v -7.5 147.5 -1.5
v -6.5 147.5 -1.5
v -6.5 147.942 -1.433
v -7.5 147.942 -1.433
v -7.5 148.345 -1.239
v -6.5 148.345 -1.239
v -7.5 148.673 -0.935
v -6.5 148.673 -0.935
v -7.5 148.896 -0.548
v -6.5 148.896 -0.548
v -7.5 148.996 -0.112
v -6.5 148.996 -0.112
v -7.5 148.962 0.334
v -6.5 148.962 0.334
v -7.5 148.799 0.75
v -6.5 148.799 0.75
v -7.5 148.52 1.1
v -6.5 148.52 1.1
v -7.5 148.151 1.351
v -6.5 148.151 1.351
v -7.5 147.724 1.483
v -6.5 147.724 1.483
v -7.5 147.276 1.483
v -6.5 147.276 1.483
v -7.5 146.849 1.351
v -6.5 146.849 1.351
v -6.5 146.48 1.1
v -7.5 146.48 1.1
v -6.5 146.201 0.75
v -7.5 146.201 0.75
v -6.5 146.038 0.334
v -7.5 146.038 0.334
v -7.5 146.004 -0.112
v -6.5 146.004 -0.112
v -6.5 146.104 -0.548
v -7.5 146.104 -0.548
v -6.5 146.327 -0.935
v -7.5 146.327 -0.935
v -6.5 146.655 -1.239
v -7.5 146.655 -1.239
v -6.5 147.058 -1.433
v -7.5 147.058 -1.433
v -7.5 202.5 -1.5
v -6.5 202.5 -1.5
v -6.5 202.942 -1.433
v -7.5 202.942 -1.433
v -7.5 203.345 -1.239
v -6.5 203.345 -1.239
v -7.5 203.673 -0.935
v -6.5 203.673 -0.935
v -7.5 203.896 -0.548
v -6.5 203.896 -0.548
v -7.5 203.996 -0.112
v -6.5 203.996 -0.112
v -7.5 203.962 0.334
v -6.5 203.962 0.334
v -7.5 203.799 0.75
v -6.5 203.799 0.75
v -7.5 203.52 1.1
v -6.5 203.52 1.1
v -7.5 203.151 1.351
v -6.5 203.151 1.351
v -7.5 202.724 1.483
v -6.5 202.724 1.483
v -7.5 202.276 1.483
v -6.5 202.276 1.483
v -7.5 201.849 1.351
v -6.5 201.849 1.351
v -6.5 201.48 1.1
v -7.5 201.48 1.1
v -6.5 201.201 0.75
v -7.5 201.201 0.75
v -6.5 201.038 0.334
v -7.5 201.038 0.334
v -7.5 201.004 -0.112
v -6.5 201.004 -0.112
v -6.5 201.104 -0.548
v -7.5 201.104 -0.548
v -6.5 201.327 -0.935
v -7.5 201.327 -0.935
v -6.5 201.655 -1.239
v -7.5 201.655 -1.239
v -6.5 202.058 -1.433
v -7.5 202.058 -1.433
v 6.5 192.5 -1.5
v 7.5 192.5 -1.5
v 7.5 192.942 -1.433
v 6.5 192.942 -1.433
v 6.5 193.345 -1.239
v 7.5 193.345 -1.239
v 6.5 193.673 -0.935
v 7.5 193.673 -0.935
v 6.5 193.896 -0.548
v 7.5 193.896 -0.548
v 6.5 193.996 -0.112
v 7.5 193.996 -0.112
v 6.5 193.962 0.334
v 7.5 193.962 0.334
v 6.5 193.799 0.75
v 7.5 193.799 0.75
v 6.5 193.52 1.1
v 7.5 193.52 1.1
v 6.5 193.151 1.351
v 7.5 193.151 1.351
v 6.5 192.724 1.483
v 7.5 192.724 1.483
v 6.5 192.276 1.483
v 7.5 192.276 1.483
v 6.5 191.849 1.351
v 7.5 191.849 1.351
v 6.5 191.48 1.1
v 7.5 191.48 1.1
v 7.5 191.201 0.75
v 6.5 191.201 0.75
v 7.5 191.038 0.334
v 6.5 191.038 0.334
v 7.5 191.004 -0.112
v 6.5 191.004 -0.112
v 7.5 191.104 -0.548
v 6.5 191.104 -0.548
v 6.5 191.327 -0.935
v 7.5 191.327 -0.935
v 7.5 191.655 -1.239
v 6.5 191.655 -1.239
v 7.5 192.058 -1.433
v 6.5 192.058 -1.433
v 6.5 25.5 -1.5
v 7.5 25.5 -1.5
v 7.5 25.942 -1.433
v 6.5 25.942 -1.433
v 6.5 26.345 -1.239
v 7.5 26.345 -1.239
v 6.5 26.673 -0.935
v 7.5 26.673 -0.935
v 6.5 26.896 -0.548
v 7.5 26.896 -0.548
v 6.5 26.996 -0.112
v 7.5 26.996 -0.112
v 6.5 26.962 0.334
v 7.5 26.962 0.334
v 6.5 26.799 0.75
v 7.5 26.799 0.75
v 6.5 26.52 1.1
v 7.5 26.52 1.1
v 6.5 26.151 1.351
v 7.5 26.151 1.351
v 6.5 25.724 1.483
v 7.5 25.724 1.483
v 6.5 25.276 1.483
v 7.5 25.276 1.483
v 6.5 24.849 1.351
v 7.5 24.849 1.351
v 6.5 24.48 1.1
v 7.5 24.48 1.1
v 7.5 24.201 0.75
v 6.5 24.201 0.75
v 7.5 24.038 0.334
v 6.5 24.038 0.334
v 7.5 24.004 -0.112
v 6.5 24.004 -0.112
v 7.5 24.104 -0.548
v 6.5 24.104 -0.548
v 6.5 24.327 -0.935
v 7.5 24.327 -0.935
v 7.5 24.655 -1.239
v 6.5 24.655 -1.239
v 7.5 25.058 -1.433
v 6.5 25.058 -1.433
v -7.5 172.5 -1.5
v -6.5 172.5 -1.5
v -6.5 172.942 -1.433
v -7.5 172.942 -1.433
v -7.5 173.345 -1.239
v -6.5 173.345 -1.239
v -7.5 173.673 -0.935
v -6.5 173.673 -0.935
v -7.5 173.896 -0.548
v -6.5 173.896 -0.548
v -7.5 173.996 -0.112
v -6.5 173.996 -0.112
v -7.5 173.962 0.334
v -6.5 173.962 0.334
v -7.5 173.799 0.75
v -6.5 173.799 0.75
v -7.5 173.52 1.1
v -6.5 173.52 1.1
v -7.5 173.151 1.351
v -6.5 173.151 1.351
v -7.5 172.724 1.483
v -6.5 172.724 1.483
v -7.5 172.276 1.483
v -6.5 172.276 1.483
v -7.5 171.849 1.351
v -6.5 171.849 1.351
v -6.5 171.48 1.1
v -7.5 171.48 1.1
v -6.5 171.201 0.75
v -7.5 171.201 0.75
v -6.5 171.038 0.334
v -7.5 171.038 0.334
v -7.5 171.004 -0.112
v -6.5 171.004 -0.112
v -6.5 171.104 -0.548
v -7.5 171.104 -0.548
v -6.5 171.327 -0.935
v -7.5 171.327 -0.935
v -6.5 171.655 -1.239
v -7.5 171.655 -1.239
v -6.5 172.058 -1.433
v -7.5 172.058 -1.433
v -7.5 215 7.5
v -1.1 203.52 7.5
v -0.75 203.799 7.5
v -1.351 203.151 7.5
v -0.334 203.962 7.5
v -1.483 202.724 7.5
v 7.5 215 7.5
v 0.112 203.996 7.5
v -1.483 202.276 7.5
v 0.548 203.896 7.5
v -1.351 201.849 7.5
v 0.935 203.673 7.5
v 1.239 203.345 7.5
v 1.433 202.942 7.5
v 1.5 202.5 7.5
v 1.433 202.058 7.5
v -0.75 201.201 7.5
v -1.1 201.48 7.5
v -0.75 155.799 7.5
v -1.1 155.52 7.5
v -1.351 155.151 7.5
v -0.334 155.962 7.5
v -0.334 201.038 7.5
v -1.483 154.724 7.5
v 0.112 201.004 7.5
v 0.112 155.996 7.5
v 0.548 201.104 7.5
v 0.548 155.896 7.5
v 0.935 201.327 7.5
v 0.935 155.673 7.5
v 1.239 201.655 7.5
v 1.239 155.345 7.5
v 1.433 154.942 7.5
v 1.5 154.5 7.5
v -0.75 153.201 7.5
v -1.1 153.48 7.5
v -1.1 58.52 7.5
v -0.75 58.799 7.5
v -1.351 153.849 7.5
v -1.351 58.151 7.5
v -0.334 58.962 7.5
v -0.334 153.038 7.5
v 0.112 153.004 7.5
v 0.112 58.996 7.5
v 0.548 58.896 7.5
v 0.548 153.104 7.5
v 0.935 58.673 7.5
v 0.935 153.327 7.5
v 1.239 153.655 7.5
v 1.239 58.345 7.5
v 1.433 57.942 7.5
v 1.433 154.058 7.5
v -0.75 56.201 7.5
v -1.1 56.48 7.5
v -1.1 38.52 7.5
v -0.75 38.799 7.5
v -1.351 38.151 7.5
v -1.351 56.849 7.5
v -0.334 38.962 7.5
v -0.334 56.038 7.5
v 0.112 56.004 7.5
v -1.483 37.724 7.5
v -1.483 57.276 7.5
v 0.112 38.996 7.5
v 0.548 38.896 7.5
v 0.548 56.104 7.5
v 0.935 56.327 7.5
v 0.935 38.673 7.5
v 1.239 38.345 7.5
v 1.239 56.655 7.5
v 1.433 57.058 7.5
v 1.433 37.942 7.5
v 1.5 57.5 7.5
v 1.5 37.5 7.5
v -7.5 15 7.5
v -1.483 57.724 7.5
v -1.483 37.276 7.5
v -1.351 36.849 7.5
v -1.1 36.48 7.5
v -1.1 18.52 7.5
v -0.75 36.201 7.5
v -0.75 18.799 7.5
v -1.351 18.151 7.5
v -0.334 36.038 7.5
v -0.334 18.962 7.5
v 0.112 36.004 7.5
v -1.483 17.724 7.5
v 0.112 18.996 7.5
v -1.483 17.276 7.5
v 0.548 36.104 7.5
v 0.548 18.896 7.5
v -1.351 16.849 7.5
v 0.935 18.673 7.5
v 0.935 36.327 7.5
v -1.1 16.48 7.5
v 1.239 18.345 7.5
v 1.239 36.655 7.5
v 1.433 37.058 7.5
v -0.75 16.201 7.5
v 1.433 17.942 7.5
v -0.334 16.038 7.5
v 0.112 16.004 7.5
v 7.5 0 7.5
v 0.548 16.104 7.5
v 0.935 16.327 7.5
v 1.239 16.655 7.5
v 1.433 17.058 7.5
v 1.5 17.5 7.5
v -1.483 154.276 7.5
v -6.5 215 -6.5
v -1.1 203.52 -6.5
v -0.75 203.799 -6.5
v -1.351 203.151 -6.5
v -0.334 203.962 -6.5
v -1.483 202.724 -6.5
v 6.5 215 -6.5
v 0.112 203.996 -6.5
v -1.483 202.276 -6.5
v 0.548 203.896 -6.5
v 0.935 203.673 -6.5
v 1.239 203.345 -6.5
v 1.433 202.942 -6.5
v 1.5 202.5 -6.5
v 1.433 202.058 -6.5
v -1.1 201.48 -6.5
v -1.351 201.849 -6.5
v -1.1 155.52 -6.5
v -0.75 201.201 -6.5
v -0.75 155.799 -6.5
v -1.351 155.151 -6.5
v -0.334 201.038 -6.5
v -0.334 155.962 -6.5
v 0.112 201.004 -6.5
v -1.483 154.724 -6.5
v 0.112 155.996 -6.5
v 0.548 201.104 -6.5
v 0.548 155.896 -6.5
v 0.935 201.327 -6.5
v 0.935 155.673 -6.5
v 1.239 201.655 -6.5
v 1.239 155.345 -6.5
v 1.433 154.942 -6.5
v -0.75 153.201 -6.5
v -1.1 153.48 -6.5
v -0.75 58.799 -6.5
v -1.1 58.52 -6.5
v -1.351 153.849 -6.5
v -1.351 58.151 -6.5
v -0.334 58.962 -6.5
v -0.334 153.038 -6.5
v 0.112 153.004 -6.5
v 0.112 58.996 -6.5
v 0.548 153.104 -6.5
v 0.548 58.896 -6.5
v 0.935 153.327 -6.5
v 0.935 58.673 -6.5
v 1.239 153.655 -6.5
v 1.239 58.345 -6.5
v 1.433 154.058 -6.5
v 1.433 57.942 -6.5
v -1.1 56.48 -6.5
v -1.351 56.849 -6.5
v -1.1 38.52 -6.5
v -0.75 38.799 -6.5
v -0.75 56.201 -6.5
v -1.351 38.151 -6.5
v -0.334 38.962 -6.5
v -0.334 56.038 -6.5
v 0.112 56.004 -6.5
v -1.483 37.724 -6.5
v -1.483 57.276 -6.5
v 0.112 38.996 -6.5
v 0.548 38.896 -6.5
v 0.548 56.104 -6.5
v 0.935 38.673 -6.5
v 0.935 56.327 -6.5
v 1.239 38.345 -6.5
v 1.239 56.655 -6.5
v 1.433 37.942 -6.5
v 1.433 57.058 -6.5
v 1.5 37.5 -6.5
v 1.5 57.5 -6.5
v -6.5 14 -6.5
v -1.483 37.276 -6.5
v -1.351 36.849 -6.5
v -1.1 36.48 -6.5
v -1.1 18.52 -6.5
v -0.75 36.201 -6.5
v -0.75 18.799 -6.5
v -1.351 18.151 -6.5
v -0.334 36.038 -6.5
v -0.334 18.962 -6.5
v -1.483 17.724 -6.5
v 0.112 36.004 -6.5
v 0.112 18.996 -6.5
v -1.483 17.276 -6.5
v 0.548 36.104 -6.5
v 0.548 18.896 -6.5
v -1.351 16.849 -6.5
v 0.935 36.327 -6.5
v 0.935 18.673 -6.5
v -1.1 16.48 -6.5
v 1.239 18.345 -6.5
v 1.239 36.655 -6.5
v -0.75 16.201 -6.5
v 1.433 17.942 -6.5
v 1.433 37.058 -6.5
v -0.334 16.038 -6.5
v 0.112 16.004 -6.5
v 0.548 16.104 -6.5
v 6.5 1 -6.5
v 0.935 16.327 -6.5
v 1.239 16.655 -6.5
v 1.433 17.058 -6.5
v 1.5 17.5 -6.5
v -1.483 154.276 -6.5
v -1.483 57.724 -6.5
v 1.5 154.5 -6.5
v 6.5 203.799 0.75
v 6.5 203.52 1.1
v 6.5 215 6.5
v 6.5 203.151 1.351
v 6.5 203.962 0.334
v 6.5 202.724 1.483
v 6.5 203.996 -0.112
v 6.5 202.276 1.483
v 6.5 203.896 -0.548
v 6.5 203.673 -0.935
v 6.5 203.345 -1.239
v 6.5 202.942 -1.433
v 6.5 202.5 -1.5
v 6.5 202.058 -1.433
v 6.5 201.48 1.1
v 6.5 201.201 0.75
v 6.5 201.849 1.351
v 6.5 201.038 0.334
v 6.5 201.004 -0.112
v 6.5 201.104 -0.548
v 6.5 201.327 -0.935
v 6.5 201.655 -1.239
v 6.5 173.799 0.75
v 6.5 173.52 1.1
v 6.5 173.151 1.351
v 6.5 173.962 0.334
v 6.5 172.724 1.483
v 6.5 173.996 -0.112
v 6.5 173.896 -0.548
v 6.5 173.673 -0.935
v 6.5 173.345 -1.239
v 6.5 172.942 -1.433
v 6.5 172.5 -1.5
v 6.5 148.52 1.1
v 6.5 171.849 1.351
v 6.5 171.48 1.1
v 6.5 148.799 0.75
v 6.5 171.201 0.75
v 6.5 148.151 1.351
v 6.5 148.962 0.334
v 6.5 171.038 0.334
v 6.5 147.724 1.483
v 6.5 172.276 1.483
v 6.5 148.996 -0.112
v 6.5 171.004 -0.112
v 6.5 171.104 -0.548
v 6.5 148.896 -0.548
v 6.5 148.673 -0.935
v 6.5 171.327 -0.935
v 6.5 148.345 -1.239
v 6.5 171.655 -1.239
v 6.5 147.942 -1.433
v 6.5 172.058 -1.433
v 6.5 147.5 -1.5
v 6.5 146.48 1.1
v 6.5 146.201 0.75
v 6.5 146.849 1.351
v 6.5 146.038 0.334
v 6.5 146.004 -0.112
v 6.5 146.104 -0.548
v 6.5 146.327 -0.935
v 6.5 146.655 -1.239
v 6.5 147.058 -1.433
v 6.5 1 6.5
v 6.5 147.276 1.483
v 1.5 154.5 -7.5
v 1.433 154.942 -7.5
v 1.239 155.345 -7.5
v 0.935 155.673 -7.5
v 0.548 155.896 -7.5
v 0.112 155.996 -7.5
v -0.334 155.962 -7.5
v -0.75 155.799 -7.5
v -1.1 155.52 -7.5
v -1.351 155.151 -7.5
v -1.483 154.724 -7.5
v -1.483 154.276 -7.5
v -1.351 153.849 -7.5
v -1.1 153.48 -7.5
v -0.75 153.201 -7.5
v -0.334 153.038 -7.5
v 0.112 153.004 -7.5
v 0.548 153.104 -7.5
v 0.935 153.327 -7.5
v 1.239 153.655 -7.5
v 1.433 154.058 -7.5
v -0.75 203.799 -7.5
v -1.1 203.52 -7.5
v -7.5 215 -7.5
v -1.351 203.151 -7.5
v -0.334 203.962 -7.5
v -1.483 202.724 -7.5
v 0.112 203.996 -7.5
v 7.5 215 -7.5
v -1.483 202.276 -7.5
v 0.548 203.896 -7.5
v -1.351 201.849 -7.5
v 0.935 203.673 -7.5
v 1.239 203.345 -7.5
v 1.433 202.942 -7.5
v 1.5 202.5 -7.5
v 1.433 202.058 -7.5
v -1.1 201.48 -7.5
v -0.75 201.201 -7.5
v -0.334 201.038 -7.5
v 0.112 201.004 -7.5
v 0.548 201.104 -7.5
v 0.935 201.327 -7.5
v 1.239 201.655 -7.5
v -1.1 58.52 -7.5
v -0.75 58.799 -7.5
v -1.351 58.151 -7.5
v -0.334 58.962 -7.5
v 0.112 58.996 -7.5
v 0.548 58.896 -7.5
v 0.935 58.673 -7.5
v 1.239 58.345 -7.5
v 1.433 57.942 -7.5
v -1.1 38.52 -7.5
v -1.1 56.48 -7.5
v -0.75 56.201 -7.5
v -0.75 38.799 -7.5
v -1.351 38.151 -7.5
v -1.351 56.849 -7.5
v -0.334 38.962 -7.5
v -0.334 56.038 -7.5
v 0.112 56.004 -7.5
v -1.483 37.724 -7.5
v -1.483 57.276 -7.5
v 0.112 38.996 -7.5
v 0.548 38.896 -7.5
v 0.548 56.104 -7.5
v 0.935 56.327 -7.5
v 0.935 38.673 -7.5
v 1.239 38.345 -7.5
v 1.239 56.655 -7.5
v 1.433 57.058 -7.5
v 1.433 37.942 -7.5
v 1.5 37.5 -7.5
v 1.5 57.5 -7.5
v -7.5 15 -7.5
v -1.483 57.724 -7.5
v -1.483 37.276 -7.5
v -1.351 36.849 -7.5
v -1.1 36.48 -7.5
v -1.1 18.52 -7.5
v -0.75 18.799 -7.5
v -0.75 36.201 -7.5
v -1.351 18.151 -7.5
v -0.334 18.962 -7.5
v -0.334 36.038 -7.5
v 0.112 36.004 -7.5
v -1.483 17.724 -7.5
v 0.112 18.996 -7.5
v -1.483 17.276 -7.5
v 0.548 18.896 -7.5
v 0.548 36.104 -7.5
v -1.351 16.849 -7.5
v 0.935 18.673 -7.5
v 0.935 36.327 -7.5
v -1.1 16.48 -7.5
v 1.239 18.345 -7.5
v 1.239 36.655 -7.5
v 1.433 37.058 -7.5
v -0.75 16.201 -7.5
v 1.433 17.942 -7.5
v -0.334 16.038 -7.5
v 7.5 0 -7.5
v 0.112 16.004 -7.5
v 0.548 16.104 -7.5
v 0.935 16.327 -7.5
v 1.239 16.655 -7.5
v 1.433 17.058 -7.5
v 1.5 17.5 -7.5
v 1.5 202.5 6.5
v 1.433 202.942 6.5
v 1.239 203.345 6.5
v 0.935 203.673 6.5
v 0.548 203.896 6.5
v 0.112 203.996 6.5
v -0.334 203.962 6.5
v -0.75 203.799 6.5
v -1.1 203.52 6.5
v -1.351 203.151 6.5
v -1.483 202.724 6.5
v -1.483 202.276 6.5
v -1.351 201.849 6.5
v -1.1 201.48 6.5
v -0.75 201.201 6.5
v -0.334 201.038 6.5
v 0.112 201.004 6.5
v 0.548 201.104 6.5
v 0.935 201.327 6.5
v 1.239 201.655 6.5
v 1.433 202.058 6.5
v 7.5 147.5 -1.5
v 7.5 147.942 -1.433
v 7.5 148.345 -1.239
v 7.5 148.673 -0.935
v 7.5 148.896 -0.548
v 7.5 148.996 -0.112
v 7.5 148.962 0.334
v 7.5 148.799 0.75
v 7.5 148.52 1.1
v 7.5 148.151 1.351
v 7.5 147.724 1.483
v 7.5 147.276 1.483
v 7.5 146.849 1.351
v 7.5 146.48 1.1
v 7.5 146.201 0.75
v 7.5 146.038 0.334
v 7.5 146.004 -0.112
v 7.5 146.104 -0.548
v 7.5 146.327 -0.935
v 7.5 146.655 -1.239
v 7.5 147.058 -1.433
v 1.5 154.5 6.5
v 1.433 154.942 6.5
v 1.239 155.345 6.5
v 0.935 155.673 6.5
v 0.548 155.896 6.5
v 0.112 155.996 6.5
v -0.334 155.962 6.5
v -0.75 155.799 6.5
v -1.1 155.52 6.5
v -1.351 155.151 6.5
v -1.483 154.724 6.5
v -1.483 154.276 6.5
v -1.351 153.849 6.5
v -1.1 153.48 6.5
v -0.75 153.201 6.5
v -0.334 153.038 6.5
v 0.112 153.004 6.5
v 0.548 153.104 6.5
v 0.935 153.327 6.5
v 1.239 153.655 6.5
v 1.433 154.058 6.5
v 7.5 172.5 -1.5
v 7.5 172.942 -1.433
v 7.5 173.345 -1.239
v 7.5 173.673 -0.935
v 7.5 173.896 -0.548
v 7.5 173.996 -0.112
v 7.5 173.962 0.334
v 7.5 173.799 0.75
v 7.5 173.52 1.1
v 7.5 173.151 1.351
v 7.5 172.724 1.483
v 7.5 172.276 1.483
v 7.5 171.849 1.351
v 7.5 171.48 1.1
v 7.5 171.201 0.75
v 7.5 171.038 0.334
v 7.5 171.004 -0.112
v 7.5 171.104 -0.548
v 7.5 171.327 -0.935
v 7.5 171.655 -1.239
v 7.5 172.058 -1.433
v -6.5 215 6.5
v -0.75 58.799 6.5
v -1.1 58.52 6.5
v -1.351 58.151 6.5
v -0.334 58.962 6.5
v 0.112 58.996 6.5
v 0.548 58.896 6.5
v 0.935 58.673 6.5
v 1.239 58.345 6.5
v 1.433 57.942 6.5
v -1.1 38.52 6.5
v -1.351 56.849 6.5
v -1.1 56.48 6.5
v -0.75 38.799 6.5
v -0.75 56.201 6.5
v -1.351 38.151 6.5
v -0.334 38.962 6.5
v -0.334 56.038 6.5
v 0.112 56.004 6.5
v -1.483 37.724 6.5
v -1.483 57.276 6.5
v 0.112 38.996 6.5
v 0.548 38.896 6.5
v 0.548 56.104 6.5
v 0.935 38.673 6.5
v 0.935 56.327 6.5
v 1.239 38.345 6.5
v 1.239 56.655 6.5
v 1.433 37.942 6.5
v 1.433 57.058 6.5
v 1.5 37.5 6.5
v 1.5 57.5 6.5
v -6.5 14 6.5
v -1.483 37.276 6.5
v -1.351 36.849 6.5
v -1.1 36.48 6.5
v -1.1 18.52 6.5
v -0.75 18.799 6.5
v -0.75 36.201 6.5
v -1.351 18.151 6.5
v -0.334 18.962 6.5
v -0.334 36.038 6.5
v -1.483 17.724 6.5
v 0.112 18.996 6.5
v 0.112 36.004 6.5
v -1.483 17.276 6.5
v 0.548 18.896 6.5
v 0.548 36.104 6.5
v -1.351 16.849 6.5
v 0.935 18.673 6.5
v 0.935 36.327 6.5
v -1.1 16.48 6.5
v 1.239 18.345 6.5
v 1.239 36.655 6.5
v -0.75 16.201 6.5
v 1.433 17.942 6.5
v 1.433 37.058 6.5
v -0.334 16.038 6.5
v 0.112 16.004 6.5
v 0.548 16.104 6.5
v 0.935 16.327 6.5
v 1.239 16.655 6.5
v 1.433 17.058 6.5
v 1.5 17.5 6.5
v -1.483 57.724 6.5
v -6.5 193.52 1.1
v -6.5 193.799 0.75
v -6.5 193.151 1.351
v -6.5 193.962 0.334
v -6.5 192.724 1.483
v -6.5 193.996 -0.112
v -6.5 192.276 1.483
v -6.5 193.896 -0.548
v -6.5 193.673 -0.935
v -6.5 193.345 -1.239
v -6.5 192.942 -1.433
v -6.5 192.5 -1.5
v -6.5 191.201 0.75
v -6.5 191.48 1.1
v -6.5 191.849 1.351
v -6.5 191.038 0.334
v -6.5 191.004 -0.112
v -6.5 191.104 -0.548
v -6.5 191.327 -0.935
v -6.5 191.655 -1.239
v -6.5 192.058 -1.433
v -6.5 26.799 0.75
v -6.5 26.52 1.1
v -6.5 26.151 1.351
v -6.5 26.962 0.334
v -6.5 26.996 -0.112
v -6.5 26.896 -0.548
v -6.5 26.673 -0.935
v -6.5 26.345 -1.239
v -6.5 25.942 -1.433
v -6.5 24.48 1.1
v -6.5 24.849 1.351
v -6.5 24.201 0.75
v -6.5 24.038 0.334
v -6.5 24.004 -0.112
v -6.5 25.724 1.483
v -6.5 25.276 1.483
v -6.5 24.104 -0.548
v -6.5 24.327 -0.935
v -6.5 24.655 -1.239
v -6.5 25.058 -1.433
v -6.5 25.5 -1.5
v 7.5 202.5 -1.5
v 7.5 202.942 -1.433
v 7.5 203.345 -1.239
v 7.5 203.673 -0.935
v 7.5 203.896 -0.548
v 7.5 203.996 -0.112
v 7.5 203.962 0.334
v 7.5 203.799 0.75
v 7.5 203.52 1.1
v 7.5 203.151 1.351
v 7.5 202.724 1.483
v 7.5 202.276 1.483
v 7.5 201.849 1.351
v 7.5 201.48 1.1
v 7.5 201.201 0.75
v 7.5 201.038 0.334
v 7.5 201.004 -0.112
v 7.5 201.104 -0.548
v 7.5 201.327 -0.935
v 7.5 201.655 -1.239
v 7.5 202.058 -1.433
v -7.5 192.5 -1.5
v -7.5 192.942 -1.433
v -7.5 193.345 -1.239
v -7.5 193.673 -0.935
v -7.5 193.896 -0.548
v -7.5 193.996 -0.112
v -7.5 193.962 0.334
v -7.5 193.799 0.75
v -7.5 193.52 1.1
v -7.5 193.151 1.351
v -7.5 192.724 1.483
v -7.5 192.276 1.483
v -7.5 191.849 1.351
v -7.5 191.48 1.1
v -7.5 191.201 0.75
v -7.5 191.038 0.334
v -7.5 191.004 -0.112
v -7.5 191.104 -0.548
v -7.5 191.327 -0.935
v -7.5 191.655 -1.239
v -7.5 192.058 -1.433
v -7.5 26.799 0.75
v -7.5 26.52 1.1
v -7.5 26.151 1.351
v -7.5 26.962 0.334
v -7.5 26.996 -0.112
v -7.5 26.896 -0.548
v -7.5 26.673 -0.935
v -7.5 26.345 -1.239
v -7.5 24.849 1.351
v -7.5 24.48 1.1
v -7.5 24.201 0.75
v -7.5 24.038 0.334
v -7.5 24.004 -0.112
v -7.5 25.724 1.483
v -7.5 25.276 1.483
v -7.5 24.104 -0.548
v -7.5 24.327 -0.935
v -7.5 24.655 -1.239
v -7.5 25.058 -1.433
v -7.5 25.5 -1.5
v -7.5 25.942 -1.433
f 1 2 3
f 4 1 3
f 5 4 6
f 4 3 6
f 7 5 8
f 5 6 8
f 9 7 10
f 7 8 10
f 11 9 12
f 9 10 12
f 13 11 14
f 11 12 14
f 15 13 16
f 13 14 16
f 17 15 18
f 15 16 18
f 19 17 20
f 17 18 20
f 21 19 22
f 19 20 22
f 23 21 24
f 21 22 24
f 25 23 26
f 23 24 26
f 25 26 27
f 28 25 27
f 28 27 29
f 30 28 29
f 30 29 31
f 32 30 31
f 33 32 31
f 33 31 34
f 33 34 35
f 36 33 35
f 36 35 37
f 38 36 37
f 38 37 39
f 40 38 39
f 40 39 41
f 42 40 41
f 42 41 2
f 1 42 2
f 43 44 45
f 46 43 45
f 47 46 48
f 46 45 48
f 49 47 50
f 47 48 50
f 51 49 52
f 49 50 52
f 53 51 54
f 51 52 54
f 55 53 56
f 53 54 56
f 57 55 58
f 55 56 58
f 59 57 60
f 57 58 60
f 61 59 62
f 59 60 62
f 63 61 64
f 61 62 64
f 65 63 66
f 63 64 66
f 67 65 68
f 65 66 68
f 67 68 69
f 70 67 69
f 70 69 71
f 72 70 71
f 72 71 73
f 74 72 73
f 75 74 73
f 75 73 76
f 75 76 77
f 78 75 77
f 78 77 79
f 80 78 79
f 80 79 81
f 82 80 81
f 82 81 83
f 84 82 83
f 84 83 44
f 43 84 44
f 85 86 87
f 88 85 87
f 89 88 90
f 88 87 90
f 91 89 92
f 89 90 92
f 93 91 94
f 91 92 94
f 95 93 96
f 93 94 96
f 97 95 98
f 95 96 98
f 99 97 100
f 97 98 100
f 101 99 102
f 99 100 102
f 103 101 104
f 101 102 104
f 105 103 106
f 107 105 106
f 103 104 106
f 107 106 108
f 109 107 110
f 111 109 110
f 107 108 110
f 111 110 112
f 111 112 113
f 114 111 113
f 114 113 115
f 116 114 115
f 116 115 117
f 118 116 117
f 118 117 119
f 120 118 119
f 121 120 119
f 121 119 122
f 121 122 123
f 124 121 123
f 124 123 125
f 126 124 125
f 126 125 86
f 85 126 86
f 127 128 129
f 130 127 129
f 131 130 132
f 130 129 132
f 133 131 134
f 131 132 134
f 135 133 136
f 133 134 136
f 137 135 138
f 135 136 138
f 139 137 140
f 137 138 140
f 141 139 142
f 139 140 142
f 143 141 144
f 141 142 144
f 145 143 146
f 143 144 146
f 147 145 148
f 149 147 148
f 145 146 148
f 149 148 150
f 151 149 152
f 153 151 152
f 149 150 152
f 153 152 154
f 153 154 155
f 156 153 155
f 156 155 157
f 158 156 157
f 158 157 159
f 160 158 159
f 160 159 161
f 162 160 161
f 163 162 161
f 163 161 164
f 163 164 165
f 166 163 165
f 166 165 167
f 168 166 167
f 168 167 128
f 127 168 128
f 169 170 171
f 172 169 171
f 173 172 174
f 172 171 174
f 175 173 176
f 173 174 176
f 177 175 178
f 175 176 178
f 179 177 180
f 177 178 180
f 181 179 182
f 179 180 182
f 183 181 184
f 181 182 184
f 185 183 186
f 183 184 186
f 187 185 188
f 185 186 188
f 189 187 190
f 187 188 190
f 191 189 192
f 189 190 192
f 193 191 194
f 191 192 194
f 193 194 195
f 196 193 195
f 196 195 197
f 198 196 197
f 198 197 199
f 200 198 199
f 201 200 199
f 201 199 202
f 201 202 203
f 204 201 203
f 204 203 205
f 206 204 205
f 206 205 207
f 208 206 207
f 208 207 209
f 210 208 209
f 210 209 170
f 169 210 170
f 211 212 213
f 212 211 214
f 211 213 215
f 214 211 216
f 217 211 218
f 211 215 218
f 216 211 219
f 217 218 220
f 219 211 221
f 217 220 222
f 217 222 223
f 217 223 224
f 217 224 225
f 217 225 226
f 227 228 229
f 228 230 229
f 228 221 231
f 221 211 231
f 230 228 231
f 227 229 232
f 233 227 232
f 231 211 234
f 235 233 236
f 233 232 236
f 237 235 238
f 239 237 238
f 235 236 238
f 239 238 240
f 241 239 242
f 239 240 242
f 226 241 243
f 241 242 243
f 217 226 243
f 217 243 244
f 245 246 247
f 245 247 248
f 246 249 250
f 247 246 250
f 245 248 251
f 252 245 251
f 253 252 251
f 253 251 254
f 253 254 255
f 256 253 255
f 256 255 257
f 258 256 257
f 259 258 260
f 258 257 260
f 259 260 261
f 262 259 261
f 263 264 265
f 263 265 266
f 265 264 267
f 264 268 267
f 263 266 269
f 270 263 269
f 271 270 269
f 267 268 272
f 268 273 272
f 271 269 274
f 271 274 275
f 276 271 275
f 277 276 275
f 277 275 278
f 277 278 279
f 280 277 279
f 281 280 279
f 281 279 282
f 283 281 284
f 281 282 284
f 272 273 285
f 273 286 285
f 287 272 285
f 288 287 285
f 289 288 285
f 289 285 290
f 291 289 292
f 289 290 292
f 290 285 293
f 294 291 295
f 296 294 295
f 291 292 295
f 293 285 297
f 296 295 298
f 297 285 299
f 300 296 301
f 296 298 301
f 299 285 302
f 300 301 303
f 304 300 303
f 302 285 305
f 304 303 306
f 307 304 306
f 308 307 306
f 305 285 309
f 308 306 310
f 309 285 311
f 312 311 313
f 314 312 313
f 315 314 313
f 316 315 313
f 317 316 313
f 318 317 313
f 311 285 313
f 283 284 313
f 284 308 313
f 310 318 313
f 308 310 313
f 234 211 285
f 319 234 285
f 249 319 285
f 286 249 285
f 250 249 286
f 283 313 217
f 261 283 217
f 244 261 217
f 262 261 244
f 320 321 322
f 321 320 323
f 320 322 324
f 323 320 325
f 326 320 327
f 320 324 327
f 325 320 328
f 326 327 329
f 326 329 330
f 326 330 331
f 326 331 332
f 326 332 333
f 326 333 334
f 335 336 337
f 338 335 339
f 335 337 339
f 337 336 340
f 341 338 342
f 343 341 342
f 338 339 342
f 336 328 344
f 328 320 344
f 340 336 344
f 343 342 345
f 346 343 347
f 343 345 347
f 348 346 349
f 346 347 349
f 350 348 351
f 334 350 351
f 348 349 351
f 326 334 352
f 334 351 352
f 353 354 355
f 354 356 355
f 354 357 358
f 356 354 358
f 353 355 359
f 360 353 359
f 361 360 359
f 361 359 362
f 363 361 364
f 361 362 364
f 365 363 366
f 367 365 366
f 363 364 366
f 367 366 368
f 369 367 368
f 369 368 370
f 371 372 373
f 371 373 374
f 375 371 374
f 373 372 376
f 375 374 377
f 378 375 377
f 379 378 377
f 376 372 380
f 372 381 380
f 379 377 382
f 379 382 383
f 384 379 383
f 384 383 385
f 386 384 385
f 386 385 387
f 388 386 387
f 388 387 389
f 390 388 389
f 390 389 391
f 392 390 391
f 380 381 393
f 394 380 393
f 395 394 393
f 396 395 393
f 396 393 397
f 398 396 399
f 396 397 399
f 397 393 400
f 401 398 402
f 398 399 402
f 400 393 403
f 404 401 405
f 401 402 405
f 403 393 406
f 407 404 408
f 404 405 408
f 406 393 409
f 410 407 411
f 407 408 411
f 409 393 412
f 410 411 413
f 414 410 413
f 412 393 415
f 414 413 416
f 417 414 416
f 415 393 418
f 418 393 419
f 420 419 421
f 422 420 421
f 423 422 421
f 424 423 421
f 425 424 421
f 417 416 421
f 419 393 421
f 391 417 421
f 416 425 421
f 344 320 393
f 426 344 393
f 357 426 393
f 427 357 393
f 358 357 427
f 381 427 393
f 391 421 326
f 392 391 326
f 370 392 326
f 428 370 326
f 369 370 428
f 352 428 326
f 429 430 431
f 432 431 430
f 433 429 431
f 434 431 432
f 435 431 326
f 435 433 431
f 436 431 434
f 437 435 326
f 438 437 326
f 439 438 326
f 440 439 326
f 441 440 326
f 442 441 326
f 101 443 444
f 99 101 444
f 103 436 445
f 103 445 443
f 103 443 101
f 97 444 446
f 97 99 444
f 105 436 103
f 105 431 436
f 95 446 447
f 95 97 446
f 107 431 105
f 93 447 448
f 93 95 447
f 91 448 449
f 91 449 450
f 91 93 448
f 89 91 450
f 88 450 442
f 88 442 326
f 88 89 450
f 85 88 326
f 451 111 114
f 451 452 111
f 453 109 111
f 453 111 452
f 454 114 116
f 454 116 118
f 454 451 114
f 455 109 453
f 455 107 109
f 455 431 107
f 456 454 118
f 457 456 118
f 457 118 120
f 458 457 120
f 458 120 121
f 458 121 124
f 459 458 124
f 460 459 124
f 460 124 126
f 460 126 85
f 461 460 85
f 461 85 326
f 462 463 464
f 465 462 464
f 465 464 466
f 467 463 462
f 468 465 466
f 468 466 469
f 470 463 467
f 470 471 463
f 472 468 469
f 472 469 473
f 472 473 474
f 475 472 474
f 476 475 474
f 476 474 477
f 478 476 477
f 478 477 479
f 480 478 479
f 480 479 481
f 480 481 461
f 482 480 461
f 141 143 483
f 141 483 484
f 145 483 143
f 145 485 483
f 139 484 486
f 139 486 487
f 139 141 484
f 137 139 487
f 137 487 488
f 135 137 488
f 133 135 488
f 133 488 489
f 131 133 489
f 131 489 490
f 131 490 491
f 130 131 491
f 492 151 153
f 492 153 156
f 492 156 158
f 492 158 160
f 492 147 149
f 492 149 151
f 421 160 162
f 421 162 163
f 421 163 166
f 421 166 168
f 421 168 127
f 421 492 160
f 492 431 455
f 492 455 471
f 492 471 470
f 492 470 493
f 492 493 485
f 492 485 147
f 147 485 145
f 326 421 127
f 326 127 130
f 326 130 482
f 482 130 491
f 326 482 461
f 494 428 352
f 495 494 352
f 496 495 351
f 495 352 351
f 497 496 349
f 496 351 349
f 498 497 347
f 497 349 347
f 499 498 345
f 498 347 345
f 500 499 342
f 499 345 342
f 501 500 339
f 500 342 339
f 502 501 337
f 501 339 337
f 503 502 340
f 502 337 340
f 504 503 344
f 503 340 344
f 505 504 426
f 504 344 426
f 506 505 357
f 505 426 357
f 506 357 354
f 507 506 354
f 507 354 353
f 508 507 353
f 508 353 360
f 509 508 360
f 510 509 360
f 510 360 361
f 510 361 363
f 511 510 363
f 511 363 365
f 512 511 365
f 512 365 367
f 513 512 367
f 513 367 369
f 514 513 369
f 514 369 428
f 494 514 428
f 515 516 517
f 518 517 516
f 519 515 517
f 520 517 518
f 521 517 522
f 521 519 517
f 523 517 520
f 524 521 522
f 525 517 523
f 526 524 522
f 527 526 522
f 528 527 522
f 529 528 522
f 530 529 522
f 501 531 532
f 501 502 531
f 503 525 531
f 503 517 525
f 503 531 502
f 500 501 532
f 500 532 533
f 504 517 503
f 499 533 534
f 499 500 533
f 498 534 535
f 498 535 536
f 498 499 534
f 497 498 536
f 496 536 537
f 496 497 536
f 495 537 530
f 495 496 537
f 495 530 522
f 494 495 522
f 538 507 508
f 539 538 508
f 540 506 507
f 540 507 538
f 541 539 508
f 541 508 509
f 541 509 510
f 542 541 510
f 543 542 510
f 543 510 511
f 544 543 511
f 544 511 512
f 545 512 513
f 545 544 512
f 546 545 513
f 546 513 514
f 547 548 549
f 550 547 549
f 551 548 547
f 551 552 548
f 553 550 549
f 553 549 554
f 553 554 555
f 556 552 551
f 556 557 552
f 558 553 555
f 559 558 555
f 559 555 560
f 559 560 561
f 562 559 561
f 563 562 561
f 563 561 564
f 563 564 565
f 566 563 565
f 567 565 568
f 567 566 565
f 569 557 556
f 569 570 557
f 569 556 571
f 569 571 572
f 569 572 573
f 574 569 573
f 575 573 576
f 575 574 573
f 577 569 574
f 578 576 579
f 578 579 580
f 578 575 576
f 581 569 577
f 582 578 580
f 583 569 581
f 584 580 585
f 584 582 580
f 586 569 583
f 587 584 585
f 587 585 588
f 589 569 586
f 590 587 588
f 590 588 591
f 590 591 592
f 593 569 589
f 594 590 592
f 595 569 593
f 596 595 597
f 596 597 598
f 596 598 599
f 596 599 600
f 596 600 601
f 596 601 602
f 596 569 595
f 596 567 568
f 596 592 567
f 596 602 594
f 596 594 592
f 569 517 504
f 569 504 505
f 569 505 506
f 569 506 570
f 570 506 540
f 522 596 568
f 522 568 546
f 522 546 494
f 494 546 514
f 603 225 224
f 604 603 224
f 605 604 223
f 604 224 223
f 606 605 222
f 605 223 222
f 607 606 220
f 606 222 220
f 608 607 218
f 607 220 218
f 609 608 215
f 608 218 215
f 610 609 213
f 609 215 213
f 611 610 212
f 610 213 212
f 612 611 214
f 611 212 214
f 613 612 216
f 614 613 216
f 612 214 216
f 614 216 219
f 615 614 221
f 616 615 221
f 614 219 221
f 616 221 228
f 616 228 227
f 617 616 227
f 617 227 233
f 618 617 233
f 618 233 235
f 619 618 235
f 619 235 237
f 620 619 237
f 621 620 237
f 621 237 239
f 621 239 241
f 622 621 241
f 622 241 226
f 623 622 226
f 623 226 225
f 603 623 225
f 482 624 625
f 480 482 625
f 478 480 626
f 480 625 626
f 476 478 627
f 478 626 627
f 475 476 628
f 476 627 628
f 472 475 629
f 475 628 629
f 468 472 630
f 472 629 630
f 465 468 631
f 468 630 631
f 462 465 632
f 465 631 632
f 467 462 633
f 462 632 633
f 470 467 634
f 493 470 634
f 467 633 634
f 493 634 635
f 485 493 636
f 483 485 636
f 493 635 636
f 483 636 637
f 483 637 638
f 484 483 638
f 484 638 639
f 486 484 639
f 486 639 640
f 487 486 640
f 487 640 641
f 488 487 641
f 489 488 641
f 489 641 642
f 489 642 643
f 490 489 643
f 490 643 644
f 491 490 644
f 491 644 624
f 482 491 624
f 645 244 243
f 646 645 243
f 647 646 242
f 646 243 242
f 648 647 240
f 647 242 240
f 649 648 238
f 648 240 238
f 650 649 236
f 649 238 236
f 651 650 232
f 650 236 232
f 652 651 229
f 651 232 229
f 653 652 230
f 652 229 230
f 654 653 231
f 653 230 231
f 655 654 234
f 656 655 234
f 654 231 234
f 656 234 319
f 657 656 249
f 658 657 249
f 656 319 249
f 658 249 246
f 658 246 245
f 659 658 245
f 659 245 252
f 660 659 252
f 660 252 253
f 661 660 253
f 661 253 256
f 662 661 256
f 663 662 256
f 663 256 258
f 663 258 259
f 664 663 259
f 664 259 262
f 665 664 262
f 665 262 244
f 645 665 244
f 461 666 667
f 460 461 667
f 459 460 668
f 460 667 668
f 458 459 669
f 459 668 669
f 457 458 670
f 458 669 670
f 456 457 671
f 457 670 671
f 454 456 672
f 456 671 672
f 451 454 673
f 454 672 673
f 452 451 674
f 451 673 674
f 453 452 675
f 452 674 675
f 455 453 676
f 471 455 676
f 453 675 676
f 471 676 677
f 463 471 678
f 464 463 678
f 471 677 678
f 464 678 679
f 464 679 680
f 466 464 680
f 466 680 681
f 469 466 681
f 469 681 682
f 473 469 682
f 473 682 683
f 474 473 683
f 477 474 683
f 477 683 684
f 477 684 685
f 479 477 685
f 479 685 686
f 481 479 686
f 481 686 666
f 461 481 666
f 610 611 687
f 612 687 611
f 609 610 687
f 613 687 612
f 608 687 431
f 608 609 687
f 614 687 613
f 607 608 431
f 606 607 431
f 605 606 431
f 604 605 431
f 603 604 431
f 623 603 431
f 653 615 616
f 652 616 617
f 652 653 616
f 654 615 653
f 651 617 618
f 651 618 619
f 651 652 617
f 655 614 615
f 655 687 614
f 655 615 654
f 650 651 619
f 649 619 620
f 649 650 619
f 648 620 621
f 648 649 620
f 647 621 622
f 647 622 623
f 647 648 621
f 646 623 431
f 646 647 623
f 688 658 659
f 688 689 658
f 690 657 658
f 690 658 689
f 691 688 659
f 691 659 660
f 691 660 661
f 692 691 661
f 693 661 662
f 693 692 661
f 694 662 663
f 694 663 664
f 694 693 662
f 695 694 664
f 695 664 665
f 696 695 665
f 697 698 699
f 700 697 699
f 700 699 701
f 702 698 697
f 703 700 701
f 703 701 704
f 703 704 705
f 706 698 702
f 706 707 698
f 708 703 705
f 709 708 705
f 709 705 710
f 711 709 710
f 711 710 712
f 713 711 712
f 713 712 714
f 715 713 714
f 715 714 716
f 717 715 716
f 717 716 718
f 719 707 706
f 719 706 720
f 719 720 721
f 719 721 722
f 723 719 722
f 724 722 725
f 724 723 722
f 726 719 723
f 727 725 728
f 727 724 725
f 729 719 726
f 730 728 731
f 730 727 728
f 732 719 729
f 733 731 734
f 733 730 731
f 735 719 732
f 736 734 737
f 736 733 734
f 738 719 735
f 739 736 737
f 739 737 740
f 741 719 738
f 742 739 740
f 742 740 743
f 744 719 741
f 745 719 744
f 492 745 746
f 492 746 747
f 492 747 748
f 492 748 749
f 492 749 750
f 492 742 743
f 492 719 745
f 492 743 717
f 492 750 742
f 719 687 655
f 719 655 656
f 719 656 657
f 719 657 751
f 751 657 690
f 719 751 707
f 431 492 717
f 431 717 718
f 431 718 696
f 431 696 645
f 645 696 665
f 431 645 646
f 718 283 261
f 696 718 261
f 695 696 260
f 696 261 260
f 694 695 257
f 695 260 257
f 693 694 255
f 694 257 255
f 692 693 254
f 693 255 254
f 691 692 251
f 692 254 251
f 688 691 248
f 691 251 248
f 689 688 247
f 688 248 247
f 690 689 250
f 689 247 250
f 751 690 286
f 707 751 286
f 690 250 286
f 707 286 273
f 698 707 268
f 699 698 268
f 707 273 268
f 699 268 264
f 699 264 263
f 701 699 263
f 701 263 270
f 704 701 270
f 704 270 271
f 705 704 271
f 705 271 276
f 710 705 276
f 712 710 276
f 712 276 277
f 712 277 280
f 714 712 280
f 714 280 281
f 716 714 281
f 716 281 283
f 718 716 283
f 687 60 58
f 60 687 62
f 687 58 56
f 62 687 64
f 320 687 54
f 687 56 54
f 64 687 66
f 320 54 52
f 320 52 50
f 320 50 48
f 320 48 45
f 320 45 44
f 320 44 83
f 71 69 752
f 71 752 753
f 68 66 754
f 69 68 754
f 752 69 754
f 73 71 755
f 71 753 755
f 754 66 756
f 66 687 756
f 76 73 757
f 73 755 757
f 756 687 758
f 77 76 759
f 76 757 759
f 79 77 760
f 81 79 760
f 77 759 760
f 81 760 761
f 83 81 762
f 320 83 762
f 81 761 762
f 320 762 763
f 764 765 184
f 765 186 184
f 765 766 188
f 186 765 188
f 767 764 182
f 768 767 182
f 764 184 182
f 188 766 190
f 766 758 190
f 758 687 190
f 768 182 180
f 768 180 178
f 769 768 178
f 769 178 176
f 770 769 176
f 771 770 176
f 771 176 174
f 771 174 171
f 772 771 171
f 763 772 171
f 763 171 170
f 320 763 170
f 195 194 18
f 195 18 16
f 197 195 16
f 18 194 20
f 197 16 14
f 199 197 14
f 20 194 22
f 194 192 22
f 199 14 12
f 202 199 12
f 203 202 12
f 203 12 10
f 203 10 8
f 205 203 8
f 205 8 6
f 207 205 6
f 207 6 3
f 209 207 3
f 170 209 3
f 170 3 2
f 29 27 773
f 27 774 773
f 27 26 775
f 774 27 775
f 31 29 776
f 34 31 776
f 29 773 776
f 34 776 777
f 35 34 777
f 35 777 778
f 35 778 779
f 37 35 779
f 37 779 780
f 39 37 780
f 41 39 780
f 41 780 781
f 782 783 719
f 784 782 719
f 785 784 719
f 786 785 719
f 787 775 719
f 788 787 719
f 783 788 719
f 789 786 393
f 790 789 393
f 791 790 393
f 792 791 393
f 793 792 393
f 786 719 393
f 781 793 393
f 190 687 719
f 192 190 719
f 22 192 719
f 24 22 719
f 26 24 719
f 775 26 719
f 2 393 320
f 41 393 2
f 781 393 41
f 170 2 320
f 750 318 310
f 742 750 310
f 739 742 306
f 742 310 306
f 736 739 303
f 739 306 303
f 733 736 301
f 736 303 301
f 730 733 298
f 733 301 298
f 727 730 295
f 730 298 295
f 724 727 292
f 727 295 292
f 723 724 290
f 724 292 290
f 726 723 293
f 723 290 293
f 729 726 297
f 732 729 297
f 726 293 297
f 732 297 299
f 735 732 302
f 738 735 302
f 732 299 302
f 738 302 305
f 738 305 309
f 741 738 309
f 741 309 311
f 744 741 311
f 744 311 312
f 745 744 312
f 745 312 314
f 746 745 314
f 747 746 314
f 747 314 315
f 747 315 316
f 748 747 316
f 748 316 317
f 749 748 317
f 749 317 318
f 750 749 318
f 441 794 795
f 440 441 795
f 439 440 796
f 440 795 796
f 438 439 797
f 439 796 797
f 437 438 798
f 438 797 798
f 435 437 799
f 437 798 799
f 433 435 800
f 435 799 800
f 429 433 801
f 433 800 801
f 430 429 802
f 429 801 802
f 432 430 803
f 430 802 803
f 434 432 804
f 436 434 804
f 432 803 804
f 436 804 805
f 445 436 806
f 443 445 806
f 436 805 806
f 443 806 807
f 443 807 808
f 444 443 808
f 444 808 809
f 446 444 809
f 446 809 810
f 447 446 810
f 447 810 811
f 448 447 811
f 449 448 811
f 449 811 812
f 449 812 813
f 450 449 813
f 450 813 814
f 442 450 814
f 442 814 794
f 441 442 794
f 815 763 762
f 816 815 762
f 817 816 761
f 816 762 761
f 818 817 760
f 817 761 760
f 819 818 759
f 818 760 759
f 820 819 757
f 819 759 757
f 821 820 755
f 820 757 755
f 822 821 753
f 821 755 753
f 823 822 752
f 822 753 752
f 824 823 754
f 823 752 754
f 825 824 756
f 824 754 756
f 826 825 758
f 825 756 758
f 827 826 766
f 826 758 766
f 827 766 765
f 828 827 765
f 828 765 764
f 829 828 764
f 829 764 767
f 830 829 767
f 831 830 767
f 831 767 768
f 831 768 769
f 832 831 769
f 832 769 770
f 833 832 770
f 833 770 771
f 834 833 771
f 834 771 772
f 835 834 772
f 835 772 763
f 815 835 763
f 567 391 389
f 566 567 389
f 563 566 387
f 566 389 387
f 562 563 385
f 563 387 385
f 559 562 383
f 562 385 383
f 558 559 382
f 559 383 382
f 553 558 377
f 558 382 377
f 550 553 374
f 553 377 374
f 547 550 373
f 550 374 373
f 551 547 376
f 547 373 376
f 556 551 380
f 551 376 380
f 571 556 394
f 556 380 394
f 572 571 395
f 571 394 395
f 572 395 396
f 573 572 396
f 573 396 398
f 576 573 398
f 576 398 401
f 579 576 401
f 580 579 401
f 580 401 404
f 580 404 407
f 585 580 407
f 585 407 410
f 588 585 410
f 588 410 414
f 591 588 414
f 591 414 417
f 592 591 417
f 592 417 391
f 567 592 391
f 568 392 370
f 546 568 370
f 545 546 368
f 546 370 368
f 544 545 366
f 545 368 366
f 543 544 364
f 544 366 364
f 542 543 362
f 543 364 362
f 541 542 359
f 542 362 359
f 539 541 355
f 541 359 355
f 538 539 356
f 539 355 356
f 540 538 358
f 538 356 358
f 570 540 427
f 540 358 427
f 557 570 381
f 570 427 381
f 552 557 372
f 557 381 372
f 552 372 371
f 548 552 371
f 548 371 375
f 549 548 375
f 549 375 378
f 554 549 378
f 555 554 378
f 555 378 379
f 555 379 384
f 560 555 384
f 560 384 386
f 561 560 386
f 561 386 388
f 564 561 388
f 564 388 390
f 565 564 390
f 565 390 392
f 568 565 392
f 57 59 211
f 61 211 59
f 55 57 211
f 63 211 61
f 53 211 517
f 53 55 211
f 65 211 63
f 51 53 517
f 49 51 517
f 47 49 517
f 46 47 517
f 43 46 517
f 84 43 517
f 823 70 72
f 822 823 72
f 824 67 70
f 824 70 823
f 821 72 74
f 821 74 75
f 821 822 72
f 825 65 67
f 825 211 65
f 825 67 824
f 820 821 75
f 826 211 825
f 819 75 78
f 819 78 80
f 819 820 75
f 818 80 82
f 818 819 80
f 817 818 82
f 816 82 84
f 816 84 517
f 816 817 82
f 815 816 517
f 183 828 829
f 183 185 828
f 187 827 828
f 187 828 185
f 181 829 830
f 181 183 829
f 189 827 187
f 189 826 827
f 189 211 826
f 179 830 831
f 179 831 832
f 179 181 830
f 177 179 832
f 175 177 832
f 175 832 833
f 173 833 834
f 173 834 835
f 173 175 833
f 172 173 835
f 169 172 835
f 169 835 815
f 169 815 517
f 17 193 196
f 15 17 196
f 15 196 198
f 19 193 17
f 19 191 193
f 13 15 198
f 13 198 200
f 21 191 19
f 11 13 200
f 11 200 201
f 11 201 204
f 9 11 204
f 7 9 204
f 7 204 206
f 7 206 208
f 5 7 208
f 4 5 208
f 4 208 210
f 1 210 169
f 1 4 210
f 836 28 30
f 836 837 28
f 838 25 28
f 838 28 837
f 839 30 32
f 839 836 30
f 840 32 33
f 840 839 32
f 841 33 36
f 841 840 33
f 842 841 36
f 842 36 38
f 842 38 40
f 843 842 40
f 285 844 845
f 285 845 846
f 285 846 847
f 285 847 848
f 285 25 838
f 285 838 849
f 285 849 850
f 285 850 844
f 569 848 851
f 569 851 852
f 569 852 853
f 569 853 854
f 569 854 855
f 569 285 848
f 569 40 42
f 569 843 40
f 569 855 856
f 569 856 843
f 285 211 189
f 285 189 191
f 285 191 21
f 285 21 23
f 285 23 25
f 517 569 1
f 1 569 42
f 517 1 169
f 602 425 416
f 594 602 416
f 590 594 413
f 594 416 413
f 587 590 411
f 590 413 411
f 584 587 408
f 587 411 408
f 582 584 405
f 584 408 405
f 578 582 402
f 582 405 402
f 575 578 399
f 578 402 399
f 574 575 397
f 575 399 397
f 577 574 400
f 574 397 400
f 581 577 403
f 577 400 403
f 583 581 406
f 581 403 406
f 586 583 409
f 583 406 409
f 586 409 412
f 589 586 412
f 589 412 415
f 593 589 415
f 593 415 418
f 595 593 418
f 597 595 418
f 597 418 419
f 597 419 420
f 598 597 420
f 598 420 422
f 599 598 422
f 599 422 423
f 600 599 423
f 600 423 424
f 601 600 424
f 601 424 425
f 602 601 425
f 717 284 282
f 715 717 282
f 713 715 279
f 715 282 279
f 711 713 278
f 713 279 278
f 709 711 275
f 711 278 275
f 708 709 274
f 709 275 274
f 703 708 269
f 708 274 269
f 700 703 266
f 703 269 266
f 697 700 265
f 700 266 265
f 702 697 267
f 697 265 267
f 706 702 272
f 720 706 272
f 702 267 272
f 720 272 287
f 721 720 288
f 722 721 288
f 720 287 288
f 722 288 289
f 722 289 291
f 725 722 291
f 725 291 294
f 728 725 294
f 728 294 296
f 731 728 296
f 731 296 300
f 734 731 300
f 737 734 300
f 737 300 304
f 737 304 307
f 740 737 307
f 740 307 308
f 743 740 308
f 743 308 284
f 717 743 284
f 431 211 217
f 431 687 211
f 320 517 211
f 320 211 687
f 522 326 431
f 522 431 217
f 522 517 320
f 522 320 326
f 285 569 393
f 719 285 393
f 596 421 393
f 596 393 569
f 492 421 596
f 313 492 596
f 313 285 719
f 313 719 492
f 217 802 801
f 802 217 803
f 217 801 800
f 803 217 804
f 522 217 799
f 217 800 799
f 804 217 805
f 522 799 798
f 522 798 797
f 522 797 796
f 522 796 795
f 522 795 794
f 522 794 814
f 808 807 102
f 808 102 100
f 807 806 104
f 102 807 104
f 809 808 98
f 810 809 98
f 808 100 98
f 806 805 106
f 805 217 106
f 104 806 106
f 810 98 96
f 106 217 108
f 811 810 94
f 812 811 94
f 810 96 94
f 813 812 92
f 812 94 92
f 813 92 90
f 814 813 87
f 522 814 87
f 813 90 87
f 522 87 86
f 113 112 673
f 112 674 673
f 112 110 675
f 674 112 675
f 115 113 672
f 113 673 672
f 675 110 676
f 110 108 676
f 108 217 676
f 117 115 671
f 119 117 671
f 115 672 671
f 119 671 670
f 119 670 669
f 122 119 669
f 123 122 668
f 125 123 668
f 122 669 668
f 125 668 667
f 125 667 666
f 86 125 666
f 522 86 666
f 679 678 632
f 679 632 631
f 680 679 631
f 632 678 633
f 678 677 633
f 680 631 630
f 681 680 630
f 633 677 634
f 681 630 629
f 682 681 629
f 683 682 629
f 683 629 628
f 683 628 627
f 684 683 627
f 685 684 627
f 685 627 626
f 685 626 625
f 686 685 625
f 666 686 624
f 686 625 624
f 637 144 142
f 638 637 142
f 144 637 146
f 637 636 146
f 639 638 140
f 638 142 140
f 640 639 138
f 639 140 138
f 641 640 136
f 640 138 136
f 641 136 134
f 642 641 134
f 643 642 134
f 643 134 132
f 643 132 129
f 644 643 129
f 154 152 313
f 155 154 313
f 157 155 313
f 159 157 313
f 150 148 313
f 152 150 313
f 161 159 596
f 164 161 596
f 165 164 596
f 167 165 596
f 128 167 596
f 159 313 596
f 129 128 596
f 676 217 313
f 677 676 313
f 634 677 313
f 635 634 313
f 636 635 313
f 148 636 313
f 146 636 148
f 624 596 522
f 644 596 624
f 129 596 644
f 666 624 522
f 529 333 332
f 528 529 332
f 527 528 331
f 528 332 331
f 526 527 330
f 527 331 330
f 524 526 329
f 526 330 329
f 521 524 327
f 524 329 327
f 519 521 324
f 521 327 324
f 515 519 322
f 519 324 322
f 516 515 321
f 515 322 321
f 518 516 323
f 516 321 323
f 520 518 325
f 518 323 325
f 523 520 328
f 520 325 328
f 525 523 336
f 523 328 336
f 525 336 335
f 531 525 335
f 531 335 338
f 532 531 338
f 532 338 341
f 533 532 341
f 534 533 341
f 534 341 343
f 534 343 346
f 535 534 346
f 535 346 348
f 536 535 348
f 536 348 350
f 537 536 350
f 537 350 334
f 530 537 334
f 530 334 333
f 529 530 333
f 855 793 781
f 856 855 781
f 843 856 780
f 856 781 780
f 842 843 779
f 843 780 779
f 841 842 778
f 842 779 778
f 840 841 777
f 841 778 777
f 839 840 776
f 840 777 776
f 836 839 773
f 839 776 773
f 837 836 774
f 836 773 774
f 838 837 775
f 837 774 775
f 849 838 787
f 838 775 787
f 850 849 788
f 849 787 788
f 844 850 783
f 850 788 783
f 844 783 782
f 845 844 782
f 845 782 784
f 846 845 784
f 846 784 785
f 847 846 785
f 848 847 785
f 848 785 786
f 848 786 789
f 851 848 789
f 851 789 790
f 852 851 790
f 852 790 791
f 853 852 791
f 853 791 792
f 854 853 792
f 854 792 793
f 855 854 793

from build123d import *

# Parameters (mm, degrees)
SKETCH_1_W          = 15
SKETCH_1_H          = 15
SKETCH_1_W_2        = 13
SKETCH_1_H_2        = 13
EXTRUDE_1_DEPTH     = 215
SKETCH_2_R          = 1.5
CUT_EXTRUDE_1_DEPTH = 216.653077882
SKETCH_3_R          = 1.5
CUT_EXTRUDE_2_DEPTH = 216.653077882


with BuildPart() as part:
    # 草图1 → 凸台-拉伸1 (new body)
    with BuildSketch(Plane(origin=(0, 0, 0), x_dir=(1, 0, 0), z_dir=(0, 1, 0))):
        Rectangle(SKETCH_1_W, SKETCH_1_H)
        Rectangle(SKETCH_1_W_2, SKETCH_1_H_2, mode=Mode.SUBTRACT)
    extrude(amount=EXTRUDE_1_DEPTH)

    # 草图2 → 切除-拉伸1 (cut, through all)
    with BuildSketch(Plane.XY.offset(7.5)):
        with Locations((0, 37.5)):
            Circle(SKETCH_2_R)
        with Locations((0, 17.5)):
            Circle(SKETCH_2_R)
        with Locations((0, 57.5)):
            Circle(SKETCH_2_R)
        with Locations((0, 202.5)):
            Circle(SKETCH_2_R)
        with Locations((0, 154.5)):
            Circle(SKETCH_2_R)
        Polygon((7.5, 0), (-7.5, 0), (-7.5, 15), align=None)
    extrude(amount=-CUT_EXTRUDE_1_DEPTH, mode=Mode.SUBTRACT)

    # 草图3 → 切除-拉伸2 (cut, through all)
    with BuildSketch(Plane(origin=(7.5, 0, 0), x_dir=(0, 0, -1), z_dir=(1, 0, 0))):
        with Locations((0, 172.5)):
            Circle(SKETCH_3_R)
        with Locations((0, 192.5)):
            Circle(SKETCH_3_R)
        with Locations((0, 147.5)):
            Circle(SKETCH_3_R)
        with Locations((0, 202.5)):
            Circle(SKETCH_3_R)
        with Locations((0, 25.5)):
            Circle(SKETCH_3_R)
    extrude(amount=-CUT_EXTRUDE_2_DEPTH, mode=Mode.SUBTRACT)


solid = part.part
